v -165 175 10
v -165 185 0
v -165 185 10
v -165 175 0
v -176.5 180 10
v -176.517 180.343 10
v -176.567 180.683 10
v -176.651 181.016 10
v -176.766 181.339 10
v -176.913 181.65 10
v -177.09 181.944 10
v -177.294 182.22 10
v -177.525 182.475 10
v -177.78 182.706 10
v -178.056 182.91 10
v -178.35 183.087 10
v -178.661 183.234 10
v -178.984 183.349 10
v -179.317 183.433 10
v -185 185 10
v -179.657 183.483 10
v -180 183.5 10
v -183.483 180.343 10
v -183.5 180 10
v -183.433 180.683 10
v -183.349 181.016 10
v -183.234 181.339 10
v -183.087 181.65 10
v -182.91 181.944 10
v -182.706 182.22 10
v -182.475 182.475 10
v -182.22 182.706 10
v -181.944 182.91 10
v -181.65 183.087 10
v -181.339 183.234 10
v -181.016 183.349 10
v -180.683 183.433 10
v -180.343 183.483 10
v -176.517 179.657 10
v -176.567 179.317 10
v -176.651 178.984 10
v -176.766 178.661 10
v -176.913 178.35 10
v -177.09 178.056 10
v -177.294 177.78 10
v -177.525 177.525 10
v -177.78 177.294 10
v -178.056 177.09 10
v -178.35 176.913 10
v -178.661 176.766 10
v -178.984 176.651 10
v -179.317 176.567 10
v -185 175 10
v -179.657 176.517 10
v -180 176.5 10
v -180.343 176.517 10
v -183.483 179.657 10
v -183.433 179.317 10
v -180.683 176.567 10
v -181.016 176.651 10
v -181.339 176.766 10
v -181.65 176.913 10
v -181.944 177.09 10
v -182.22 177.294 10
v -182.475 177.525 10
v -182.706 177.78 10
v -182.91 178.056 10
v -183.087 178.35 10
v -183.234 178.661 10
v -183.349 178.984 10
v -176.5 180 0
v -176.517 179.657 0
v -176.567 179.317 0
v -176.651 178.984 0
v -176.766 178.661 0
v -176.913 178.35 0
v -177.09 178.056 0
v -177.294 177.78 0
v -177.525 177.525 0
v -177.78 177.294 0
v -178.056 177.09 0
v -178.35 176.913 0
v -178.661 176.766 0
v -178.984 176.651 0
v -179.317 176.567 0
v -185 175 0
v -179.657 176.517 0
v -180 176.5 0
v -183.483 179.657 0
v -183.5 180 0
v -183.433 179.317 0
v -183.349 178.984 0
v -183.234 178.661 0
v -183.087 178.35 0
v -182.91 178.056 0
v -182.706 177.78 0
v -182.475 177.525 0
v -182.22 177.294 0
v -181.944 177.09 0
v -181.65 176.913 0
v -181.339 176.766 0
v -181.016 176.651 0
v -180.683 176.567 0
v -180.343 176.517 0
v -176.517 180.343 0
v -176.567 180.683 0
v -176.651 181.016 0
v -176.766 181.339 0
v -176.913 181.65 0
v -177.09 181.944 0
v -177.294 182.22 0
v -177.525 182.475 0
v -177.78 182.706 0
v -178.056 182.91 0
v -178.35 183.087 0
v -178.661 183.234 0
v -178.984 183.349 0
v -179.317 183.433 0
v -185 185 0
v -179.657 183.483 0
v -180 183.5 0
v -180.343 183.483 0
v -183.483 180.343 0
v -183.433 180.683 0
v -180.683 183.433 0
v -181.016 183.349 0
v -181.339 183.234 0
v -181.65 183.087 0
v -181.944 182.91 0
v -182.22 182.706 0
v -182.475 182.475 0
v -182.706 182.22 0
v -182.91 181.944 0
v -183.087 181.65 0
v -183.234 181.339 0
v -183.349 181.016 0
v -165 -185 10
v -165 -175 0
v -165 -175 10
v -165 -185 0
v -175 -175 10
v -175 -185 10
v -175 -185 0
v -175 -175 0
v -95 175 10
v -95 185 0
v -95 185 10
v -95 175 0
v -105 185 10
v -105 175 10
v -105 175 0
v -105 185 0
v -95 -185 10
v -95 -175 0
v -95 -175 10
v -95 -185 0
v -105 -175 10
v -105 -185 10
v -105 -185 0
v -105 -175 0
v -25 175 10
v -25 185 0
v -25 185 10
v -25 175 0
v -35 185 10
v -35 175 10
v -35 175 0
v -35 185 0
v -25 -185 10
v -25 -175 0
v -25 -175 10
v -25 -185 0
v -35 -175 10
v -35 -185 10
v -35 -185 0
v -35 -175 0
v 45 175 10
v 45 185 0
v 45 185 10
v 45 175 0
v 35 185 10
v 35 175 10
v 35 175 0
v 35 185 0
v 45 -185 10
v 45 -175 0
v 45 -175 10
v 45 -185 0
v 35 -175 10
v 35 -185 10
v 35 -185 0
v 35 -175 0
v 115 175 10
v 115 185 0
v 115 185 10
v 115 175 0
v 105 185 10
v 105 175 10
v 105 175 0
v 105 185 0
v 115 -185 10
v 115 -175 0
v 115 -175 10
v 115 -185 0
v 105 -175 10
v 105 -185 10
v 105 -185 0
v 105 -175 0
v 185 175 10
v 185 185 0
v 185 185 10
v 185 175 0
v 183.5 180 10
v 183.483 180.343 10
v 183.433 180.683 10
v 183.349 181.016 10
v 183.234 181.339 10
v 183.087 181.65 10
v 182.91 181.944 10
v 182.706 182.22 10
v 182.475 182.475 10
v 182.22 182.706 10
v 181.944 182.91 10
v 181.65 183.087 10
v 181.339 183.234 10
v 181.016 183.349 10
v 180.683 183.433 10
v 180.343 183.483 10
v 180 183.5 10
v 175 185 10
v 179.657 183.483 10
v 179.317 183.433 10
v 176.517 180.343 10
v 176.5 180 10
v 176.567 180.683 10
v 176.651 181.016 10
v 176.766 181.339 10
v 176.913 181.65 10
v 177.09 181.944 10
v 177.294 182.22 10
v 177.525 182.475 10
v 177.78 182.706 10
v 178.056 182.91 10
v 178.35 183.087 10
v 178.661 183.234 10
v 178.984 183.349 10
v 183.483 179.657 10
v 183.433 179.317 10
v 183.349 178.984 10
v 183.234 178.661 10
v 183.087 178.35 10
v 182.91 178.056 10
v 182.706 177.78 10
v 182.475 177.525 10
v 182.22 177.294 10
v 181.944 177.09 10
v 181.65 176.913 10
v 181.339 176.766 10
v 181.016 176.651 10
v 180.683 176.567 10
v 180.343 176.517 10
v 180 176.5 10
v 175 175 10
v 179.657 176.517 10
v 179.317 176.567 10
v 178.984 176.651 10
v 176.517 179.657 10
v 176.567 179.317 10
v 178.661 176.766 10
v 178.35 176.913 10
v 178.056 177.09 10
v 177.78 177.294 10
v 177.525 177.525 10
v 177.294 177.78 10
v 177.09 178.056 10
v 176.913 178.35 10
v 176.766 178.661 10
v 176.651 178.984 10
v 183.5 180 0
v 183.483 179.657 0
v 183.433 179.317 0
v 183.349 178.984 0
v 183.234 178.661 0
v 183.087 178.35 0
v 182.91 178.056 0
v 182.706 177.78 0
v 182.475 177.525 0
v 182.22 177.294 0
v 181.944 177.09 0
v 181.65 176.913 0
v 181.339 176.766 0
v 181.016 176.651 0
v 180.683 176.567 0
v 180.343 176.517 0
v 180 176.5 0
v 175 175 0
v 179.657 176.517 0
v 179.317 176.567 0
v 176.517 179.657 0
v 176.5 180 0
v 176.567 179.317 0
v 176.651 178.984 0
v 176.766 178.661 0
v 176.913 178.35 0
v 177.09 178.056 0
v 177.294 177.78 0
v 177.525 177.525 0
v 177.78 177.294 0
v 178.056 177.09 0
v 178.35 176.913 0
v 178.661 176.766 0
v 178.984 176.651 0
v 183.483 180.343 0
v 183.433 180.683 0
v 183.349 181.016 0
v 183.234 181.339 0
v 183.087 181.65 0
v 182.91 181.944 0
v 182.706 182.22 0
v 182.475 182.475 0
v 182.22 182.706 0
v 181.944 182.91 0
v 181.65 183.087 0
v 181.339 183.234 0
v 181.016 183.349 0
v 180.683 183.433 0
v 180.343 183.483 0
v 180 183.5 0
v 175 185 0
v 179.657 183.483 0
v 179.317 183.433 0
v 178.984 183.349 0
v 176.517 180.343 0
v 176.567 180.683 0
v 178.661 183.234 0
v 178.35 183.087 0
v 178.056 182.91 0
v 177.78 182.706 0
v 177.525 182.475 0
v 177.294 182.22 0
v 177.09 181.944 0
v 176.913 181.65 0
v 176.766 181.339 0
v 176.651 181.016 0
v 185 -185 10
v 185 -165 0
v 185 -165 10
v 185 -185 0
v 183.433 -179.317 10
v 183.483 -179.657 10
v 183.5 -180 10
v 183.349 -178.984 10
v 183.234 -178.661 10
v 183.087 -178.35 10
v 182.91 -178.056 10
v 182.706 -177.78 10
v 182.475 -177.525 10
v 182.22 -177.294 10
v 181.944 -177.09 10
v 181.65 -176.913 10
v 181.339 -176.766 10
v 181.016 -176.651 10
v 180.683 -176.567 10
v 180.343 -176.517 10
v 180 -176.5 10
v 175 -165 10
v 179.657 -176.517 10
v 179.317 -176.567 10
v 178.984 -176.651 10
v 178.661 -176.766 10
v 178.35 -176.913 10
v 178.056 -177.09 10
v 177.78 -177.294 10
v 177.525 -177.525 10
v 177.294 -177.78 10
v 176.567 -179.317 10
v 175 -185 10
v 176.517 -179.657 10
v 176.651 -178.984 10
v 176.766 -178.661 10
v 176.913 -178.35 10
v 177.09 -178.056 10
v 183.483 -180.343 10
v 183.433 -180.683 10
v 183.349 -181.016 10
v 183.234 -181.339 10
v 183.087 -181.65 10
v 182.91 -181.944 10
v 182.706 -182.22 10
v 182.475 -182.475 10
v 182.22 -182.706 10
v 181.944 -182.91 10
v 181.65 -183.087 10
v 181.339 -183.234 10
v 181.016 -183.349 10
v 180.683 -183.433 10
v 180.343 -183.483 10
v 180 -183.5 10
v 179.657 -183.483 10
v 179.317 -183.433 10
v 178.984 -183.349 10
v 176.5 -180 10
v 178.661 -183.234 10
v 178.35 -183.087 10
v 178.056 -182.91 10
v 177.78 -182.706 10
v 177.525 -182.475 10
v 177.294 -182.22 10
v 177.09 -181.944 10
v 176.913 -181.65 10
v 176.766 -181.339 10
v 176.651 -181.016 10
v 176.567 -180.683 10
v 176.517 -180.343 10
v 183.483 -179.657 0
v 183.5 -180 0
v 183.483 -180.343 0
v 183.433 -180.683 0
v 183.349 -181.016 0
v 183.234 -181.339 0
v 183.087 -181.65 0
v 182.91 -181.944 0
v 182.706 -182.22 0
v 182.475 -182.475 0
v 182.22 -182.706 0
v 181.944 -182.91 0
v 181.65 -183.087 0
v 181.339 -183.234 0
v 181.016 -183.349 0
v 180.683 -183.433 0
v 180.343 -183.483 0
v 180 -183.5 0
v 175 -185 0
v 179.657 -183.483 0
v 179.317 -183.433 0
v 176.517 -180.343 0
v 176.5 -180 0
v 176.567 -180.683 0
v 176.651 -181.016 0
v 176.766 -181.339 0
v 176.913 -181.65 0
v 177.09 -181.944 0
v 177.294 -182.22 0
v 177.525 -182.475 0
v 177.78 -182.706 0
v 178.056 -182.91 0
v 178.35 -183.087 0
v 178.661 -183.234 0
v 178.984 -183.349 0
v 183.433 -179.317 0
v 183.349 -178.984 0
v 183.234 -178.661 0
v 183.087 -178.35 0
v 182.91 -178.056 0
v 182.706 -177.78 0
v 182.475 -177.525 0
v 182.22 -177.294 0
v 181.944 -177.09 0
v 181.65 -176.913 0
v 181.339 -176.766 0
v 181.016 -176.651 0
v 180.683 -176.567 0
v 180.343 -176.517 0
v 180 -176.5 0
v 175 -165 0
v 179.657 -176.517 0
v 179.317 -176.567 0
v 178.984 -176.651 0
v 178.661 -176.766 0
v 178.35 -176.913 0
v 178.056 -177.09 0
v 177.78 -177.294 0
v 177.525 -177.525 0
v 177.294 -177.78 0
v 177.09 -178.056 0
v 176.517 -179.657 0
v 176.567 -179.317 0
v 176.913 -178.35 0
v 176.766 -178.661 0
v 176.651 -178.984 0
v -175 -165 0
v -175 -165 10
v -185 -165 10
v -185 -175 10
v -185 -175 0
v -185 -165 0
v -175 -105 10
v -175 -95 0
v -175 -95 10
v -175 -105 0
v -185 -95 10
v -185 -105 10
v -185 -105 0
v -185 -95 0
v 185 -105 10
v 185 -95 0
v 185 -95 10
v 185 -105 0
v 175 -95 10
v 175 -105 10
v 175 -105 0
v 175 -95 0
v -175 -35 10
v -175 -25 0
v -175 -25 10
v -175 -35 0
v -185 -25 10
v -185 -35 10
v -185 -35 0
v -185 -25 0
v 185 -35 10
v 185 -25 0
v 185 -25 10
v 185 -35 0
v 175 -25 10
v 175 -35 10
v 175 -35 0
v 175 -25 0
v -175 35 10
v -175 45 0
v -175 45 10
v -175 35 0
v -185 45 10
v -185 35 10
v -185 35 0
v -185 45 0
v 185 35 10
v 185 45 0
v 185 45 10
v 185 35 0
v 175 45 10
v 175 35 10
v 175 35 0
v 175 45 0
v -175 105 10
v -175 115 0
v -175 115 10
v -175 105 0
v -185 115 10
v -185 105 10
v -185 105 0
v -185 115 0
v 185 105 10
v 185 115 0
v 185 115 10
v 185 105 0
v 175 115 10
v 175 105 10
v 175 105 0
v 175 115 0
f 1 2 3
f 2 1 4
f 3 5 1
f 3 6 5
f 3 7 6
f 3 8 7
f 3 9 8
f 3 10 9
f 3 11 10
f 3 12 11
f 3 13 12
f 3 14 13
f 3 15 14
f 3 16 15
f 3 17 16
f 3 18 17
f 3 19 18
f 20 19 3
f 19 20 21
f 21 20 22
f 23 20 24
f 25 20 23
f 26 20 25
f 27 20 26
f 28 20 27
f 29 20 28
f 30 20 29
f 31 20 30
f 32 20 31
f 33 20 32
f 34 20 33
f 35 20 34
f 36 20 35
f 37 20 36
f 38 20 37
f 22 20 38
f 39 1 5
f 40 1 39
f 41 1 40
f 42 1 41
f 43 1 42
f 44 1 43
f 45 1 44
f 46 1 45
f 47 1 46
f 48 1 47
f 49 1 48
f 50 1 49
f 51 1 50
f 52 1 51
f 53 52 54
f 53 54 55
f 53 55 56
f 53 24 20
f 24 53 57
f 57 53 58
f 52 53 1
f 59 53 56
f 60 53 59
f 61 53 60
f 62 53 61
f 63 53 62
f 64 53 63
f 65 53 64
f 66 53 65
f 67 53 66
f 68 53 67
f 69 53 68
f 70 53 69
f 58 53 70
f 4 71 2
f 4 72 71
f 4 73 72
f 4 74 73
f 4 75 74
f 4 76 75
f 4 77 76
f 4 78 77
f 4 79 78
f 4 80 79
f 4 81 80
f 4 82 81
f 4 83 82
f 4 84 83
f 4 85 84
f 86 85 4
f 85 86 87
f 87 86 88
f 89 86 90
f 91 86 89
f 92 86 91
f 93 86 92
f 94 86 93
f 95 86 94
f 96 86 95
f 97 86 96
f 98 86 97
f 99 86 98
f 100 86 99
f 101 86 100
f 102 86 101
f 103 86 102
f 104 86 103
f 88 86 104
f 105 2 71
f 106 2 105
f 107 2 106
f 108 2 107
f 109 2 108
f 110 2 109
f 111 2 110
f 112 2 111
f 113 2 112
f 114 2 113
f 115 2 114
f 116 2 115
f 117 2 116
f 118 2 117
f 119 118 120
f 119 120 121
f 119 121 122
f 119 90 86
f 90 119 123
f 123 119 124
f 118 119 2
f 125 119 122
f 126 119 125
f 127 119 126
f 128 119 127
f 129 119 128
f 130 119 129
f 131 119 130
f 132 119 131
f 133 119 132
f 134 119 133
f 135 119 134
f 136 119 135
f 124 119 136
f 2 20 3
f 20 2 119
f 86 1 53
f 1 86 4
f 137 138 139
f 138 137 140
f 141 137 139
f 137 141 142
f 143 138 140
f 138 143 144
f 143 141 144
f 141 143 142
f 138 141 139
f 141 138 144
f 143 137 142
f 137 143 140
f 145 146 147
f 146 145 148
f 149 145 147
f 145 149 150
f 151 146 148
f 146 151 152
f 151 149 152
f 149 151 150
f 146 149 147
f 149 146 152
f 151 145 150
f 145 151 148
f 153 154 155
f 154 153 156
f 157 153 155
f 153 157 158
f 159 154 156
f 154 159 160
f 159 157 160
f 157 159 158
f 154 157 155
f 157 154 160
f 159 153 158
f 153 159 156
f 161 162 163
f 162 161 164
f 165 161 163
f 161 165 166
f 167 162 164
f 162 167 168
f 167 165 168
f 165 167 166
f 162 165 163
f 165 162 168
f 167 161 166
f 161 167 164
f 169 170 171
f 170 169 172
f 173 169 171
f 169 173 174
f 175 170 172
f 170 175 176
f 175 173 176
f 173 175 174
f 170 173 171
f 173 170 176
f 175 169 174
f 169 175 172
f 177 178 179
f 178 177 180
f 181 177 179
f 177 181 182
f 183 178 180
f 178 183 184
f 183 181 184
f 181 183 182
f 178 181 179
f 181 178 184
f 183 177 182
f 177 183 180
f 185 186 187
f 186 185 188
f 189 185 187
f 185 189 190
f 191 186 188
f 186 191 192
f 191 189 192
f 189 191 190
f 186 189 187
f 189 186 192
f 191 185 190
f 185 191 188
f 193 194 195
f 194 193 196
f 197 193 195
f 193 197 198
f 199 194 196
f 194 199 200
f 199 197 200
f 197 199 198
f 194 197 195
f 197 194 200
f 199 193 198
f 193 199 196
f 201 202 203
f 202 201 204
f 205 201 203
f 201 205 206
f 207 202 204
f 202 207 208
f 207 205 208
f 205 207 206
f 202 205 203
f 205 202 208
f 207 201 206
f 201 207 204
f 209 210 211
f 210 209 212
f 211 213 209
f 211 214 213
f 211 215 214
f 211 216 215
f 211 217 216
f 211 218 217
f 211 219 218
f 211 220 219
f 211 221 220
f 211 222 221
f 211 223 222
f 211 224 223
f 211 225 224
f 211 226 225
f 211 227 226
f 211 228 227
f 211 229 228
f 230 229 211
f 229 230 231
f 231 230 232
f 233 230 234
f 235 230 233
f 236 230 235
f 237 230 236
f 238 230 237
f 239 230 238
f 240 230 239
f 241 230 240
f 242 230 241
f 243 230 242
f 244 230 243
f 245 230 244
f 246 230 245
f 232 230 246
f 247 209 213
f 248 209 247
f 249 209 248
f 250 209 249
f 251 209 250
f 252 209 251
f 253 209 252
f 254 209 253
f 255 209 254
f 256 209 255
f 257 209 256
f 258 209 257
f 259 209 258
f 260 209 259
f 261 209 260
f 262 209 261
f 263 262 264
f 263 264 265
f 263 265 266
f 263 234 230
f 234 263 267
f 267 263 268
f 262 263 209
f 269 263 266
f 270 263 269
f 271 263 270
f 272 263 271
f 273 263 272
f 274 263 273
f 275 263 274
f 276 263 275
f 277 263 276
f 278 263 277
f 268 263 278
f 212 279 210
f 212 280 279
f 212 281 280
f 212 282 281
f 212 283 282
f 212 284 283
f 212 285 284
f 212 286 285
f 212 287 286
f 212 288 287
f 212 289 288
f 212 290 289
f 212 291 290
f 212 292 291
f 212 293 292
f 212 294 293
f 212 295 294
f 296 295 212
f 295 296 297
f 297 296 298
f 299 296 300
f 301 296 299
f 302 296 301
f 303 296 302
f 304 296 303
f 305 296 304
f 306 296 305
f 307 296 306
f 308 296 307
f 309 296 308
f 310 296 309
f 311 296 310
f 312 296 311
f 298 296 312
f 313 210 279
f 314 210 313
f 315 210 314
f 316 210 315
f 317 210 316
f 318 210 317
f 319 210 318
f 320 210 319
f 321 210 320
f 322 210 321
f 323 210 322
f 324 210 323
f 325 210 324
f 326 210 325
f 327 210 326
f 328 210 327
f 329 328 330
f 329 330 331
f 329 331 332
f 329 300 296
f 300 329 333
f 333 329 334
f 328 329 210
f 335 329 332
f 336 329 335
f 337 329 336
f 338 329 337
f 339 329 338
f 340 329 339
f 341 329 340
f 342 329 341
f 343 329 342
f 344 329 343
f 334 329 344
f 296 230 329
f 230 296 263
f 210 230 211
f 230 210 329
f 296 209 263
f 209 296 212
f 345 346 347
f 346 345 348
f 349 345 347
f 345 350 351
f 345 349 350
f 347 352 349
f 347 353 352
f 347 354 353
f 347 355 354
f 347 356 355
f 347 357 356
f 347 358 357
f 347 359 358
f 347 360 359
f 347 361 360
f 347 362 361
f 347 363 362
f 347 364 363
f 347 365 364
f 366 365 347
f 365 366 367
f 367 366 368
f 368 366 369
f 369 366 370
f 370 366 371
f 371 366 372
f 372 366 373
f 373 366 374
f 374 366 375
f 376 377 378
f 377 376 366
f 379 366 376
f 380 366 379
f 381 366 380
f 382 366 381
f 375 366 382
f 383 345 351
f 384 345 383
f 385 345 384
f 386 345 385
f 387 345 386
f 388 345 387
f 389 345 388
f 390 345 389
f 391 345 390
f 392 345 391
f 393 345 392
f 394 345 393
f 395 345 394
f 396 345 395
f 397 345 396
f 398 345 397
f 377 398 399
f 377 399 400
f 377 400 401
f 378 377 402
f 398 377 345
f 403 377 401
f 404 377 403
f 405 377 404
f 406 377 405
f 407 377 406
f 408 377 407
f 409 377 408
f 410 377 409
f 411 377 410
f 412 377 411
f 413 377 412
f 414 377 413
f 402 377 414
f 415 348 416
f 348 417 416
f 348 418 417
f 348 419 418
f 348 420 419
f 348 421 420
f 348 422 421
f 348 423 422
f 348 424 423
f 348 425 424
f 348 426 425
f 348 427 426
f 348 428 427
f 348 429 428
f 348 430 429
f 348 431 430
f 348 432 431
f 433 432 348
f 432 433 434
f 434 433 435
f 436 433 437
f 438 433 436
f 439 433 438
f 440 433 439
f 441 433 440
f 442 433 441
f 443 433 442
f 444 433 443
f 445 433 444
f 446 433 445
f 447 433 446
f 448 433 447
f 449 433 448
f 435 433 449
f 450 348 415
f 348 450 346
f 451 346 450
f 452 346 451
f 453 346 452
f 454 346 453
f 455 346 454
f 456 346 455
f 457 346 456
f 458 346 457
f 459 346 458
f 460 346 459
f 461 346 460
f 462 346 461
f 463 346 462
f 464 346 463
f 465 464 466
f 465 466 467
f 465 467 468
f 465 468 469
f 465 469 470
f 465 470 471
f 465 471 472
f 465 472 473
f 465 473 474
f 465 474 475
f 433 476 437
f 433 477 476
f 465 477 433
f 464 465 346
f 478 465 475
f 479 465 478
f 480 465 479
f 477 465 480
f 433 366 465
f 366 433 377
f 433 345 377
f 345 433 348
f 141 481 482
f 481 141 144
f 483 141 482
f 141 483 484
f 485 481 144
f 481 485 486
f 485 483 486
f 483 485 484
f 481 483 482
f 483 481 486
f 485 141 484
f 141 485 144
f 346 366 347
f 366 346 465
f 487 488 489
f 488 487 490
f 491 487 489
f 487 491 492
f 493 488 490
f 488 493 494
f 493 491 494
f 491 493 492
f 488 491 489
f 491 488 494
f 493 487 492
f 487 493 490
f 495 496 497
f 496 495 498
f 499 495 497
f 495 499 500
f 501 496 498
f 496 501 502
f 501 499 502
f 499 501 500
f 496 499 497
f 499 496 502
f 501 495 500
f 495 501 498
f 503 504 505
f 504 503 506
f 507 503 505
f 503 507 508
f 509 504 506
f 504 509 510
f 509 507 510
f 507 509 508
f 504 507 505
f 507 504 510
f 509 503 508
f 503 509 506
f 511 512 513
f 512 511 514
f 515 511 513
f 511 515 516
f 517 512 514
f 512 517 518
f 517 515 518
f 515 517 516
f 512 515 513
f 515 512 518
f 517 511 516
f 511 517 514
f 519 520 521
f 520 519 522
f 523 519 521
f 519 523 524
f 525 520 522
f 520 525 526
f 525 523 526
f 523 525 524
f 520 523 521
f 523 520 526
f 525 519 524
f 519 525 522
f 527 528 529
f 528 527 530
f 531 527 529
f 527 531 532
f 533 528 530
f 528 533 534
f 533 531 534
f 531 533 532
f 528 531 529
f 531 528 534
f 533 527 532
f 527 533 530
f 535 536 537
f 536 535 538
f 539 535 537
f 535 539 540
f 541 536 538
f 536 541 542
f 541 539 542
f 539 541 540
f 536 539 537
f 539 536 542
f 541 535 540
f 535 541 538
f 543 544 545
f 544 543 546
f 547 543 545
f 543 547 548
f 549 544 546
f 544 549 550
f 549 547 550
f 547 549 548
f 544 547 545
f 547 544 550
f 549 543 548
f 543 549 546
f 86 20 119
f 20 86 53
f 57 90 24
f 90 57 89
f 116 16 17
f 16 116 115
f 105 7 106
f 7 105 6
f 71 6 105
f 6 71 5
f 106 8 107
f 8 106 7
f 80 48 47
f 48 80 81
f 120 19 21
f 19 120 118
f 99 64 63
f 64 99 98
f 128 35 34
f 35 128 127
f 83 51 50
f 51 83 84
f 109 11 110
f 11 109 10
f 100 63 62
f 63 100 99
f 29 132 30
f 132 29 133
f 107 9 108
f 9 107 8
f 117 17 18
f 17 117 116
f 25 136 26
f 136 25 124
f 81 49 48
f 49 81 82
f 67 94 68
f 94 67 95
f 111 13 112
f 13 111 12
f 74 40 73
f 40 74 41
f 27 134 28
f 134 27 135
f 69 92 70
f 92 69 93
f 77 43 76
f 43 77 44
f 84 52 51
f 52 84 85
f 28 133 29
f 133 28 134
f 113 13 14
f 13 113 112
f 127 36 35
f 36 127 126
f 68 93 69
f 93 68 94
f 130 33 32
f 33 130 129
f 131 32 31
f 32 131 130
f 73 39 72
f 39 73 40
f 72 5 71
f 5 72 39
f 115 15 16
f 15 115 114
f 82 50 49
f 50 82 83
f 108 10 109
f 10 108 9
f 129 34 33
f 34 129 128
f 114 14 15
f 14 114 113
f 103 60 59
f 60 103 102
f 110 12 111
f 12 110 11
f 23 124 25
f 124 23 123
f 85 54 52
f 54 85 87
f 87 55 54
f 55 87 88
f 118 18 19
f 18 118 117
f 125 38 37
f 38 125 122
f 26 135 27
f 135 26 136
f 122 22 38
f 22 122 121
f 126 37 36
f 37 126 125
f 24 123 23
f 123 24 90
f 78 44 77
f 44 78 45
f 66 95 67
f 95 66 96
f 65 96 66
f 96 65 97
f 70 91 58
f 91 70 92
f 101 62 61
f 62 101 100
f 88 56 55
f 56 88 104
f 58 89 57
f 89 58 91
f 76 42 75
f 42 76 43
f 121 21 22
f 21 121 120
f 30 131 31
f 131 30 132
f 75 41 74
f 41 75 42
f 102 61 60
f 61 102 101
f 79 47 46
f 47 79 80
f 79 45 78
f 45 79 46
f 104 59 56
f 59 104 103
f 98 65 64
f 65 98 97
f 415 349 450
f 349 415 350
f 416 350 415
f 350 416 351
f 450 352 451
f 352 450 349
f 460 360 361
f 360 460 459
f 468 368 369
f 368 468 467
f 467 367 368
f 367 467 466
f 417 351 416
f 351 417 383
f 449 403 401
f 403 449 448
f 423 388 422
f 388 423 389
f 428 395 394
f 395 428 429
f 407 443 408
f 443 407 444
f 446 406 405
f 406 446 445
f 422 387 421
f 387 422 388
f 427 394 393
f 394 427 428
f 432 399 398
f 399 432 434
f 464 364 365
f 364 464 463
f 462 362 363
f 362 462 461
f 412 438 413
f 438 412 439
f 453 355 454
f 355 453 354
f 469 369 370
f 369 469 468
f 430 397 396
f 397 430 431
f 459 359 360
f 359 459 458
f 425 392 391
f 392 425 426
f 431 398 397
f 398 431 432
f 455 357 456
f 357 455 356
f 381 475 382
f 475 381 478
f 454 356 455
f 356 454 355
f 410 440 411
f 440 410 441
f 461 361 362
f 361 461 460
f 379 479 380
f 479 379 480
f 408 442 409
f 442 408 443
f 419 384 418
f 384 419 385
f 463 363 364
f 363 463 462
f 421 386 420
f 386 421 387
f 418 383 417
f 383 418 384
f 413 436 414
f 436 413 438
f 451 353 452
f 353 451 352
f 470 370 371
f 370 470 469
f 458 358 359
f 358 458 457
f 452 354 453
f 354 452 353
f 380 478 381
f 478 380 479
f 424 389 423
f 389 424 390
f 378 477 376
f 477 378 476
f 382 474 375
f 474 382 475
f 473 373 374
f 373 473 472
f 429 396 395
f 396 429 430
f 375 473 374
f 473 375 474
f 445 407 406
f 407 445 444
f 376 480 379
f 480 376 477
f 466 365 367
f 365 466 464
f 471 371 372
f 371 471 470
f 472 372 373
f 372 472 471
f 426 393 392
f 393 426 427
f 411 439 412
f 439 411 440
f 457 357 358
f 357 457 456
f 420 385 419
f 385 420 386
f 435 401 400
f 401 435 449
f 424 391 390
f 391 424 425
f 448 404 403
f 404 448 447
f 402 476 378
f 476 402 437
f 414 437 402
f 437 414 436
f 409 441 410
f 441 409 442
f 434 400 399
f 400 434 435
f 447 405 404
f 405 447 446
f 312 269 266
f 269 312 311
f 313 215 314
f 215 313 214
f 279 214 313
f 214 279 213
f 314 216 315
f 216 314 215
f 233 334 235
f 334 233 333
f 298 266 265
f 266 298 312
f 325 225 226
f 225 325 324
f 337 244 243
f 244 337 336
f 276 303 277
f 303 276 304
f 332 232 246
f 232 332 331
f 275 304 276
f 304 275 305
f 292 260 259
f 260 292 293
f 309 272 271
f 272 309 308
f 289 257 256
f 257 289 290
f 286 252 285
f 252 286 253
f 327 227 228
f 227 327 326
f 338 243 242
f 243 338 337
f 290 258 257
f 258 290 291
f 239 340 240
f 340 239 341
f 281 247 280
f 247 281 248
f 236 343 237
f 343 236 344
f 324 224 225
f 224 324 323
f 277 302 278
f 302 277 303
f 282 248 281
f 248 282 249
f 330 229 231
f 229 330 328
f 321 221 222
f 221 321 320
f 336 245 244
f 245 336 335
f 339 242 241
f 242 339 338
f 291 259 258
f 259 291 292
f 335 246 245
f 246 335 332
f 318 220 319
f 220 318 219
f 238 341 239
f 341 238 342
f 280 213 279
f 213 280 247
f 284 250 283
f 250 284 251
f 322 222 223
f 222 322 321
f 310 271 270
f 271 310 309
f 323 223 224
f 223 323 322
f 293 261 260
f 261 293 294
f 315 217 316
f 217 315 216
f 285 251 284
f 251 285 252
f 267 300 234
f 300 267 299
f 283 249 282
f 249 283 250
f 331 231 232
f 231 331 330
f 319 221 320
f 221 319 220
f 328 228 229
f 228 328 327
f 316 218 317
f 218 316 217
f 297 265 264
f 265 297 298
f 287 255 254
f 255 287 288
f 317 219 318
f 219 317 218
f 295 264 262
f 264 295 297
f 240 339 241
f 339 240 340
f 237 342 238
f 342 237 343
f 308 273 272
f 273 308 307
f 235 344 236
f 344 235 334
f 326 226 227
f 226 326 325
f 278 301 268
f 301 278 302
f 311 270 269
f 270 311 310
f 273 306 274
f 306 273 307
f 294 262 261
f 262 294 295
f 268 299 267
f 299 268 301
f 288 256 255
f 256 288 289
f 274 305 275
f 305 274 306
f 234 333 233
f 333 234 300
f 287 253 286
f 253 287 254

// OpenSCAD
// ring_07.scad - ring index 7 (z bottom = 70 mm)
$fn = 64; bar = 10; half_b = bar/2; outer = 370; half_outer = outer/2;
front_y = 180; back_y = -180; left_x = -180; right_x = 180;
x_centers = [-170, -100, -30, 40, 110, 180];
z_centers = [5, 85, 155, 225, 295, 365, 435, 505, 575, 645, 715]; ring_z = 70;
module place_box(cx, cy, sx, sy) { translate([cx - sx/2, cy - sy/2, 0]) cube([sx, sy, bar]); }

difference() { union() {
    for (x = x_centers) { place_box(x, front_y, bar, bar); place_box(x, back_y, bar, bar); }
    for (y = x_centers) { place_box(left_x, y, bar, bar); place_box(right_x, y, bar, bar); }
    for (zc = z_centers) if ((zc - half_b < ring_z + bar) && (zc + half_b > ring_z)) {
        translate([-half_outer, front_y - half_b, 0]) cube([outer, bar, bar]);
        translate([-half_outer, back_y - half_b, 0])  cube([outer, bar, bar]);
        translate([left_x - half_b, -half_outer, 0])  cube([bar, outer, bar]);
        translate([right_x - half_b, -half_outer, 0]) cube([bar, outer, bar]);
    }
  }
  for (cx = [-180, 180]) for (cy = [-180, 180]) translate([cx, cy, 0]) cylinder(h = bar, r = 3.5, $fn = 64);
}
